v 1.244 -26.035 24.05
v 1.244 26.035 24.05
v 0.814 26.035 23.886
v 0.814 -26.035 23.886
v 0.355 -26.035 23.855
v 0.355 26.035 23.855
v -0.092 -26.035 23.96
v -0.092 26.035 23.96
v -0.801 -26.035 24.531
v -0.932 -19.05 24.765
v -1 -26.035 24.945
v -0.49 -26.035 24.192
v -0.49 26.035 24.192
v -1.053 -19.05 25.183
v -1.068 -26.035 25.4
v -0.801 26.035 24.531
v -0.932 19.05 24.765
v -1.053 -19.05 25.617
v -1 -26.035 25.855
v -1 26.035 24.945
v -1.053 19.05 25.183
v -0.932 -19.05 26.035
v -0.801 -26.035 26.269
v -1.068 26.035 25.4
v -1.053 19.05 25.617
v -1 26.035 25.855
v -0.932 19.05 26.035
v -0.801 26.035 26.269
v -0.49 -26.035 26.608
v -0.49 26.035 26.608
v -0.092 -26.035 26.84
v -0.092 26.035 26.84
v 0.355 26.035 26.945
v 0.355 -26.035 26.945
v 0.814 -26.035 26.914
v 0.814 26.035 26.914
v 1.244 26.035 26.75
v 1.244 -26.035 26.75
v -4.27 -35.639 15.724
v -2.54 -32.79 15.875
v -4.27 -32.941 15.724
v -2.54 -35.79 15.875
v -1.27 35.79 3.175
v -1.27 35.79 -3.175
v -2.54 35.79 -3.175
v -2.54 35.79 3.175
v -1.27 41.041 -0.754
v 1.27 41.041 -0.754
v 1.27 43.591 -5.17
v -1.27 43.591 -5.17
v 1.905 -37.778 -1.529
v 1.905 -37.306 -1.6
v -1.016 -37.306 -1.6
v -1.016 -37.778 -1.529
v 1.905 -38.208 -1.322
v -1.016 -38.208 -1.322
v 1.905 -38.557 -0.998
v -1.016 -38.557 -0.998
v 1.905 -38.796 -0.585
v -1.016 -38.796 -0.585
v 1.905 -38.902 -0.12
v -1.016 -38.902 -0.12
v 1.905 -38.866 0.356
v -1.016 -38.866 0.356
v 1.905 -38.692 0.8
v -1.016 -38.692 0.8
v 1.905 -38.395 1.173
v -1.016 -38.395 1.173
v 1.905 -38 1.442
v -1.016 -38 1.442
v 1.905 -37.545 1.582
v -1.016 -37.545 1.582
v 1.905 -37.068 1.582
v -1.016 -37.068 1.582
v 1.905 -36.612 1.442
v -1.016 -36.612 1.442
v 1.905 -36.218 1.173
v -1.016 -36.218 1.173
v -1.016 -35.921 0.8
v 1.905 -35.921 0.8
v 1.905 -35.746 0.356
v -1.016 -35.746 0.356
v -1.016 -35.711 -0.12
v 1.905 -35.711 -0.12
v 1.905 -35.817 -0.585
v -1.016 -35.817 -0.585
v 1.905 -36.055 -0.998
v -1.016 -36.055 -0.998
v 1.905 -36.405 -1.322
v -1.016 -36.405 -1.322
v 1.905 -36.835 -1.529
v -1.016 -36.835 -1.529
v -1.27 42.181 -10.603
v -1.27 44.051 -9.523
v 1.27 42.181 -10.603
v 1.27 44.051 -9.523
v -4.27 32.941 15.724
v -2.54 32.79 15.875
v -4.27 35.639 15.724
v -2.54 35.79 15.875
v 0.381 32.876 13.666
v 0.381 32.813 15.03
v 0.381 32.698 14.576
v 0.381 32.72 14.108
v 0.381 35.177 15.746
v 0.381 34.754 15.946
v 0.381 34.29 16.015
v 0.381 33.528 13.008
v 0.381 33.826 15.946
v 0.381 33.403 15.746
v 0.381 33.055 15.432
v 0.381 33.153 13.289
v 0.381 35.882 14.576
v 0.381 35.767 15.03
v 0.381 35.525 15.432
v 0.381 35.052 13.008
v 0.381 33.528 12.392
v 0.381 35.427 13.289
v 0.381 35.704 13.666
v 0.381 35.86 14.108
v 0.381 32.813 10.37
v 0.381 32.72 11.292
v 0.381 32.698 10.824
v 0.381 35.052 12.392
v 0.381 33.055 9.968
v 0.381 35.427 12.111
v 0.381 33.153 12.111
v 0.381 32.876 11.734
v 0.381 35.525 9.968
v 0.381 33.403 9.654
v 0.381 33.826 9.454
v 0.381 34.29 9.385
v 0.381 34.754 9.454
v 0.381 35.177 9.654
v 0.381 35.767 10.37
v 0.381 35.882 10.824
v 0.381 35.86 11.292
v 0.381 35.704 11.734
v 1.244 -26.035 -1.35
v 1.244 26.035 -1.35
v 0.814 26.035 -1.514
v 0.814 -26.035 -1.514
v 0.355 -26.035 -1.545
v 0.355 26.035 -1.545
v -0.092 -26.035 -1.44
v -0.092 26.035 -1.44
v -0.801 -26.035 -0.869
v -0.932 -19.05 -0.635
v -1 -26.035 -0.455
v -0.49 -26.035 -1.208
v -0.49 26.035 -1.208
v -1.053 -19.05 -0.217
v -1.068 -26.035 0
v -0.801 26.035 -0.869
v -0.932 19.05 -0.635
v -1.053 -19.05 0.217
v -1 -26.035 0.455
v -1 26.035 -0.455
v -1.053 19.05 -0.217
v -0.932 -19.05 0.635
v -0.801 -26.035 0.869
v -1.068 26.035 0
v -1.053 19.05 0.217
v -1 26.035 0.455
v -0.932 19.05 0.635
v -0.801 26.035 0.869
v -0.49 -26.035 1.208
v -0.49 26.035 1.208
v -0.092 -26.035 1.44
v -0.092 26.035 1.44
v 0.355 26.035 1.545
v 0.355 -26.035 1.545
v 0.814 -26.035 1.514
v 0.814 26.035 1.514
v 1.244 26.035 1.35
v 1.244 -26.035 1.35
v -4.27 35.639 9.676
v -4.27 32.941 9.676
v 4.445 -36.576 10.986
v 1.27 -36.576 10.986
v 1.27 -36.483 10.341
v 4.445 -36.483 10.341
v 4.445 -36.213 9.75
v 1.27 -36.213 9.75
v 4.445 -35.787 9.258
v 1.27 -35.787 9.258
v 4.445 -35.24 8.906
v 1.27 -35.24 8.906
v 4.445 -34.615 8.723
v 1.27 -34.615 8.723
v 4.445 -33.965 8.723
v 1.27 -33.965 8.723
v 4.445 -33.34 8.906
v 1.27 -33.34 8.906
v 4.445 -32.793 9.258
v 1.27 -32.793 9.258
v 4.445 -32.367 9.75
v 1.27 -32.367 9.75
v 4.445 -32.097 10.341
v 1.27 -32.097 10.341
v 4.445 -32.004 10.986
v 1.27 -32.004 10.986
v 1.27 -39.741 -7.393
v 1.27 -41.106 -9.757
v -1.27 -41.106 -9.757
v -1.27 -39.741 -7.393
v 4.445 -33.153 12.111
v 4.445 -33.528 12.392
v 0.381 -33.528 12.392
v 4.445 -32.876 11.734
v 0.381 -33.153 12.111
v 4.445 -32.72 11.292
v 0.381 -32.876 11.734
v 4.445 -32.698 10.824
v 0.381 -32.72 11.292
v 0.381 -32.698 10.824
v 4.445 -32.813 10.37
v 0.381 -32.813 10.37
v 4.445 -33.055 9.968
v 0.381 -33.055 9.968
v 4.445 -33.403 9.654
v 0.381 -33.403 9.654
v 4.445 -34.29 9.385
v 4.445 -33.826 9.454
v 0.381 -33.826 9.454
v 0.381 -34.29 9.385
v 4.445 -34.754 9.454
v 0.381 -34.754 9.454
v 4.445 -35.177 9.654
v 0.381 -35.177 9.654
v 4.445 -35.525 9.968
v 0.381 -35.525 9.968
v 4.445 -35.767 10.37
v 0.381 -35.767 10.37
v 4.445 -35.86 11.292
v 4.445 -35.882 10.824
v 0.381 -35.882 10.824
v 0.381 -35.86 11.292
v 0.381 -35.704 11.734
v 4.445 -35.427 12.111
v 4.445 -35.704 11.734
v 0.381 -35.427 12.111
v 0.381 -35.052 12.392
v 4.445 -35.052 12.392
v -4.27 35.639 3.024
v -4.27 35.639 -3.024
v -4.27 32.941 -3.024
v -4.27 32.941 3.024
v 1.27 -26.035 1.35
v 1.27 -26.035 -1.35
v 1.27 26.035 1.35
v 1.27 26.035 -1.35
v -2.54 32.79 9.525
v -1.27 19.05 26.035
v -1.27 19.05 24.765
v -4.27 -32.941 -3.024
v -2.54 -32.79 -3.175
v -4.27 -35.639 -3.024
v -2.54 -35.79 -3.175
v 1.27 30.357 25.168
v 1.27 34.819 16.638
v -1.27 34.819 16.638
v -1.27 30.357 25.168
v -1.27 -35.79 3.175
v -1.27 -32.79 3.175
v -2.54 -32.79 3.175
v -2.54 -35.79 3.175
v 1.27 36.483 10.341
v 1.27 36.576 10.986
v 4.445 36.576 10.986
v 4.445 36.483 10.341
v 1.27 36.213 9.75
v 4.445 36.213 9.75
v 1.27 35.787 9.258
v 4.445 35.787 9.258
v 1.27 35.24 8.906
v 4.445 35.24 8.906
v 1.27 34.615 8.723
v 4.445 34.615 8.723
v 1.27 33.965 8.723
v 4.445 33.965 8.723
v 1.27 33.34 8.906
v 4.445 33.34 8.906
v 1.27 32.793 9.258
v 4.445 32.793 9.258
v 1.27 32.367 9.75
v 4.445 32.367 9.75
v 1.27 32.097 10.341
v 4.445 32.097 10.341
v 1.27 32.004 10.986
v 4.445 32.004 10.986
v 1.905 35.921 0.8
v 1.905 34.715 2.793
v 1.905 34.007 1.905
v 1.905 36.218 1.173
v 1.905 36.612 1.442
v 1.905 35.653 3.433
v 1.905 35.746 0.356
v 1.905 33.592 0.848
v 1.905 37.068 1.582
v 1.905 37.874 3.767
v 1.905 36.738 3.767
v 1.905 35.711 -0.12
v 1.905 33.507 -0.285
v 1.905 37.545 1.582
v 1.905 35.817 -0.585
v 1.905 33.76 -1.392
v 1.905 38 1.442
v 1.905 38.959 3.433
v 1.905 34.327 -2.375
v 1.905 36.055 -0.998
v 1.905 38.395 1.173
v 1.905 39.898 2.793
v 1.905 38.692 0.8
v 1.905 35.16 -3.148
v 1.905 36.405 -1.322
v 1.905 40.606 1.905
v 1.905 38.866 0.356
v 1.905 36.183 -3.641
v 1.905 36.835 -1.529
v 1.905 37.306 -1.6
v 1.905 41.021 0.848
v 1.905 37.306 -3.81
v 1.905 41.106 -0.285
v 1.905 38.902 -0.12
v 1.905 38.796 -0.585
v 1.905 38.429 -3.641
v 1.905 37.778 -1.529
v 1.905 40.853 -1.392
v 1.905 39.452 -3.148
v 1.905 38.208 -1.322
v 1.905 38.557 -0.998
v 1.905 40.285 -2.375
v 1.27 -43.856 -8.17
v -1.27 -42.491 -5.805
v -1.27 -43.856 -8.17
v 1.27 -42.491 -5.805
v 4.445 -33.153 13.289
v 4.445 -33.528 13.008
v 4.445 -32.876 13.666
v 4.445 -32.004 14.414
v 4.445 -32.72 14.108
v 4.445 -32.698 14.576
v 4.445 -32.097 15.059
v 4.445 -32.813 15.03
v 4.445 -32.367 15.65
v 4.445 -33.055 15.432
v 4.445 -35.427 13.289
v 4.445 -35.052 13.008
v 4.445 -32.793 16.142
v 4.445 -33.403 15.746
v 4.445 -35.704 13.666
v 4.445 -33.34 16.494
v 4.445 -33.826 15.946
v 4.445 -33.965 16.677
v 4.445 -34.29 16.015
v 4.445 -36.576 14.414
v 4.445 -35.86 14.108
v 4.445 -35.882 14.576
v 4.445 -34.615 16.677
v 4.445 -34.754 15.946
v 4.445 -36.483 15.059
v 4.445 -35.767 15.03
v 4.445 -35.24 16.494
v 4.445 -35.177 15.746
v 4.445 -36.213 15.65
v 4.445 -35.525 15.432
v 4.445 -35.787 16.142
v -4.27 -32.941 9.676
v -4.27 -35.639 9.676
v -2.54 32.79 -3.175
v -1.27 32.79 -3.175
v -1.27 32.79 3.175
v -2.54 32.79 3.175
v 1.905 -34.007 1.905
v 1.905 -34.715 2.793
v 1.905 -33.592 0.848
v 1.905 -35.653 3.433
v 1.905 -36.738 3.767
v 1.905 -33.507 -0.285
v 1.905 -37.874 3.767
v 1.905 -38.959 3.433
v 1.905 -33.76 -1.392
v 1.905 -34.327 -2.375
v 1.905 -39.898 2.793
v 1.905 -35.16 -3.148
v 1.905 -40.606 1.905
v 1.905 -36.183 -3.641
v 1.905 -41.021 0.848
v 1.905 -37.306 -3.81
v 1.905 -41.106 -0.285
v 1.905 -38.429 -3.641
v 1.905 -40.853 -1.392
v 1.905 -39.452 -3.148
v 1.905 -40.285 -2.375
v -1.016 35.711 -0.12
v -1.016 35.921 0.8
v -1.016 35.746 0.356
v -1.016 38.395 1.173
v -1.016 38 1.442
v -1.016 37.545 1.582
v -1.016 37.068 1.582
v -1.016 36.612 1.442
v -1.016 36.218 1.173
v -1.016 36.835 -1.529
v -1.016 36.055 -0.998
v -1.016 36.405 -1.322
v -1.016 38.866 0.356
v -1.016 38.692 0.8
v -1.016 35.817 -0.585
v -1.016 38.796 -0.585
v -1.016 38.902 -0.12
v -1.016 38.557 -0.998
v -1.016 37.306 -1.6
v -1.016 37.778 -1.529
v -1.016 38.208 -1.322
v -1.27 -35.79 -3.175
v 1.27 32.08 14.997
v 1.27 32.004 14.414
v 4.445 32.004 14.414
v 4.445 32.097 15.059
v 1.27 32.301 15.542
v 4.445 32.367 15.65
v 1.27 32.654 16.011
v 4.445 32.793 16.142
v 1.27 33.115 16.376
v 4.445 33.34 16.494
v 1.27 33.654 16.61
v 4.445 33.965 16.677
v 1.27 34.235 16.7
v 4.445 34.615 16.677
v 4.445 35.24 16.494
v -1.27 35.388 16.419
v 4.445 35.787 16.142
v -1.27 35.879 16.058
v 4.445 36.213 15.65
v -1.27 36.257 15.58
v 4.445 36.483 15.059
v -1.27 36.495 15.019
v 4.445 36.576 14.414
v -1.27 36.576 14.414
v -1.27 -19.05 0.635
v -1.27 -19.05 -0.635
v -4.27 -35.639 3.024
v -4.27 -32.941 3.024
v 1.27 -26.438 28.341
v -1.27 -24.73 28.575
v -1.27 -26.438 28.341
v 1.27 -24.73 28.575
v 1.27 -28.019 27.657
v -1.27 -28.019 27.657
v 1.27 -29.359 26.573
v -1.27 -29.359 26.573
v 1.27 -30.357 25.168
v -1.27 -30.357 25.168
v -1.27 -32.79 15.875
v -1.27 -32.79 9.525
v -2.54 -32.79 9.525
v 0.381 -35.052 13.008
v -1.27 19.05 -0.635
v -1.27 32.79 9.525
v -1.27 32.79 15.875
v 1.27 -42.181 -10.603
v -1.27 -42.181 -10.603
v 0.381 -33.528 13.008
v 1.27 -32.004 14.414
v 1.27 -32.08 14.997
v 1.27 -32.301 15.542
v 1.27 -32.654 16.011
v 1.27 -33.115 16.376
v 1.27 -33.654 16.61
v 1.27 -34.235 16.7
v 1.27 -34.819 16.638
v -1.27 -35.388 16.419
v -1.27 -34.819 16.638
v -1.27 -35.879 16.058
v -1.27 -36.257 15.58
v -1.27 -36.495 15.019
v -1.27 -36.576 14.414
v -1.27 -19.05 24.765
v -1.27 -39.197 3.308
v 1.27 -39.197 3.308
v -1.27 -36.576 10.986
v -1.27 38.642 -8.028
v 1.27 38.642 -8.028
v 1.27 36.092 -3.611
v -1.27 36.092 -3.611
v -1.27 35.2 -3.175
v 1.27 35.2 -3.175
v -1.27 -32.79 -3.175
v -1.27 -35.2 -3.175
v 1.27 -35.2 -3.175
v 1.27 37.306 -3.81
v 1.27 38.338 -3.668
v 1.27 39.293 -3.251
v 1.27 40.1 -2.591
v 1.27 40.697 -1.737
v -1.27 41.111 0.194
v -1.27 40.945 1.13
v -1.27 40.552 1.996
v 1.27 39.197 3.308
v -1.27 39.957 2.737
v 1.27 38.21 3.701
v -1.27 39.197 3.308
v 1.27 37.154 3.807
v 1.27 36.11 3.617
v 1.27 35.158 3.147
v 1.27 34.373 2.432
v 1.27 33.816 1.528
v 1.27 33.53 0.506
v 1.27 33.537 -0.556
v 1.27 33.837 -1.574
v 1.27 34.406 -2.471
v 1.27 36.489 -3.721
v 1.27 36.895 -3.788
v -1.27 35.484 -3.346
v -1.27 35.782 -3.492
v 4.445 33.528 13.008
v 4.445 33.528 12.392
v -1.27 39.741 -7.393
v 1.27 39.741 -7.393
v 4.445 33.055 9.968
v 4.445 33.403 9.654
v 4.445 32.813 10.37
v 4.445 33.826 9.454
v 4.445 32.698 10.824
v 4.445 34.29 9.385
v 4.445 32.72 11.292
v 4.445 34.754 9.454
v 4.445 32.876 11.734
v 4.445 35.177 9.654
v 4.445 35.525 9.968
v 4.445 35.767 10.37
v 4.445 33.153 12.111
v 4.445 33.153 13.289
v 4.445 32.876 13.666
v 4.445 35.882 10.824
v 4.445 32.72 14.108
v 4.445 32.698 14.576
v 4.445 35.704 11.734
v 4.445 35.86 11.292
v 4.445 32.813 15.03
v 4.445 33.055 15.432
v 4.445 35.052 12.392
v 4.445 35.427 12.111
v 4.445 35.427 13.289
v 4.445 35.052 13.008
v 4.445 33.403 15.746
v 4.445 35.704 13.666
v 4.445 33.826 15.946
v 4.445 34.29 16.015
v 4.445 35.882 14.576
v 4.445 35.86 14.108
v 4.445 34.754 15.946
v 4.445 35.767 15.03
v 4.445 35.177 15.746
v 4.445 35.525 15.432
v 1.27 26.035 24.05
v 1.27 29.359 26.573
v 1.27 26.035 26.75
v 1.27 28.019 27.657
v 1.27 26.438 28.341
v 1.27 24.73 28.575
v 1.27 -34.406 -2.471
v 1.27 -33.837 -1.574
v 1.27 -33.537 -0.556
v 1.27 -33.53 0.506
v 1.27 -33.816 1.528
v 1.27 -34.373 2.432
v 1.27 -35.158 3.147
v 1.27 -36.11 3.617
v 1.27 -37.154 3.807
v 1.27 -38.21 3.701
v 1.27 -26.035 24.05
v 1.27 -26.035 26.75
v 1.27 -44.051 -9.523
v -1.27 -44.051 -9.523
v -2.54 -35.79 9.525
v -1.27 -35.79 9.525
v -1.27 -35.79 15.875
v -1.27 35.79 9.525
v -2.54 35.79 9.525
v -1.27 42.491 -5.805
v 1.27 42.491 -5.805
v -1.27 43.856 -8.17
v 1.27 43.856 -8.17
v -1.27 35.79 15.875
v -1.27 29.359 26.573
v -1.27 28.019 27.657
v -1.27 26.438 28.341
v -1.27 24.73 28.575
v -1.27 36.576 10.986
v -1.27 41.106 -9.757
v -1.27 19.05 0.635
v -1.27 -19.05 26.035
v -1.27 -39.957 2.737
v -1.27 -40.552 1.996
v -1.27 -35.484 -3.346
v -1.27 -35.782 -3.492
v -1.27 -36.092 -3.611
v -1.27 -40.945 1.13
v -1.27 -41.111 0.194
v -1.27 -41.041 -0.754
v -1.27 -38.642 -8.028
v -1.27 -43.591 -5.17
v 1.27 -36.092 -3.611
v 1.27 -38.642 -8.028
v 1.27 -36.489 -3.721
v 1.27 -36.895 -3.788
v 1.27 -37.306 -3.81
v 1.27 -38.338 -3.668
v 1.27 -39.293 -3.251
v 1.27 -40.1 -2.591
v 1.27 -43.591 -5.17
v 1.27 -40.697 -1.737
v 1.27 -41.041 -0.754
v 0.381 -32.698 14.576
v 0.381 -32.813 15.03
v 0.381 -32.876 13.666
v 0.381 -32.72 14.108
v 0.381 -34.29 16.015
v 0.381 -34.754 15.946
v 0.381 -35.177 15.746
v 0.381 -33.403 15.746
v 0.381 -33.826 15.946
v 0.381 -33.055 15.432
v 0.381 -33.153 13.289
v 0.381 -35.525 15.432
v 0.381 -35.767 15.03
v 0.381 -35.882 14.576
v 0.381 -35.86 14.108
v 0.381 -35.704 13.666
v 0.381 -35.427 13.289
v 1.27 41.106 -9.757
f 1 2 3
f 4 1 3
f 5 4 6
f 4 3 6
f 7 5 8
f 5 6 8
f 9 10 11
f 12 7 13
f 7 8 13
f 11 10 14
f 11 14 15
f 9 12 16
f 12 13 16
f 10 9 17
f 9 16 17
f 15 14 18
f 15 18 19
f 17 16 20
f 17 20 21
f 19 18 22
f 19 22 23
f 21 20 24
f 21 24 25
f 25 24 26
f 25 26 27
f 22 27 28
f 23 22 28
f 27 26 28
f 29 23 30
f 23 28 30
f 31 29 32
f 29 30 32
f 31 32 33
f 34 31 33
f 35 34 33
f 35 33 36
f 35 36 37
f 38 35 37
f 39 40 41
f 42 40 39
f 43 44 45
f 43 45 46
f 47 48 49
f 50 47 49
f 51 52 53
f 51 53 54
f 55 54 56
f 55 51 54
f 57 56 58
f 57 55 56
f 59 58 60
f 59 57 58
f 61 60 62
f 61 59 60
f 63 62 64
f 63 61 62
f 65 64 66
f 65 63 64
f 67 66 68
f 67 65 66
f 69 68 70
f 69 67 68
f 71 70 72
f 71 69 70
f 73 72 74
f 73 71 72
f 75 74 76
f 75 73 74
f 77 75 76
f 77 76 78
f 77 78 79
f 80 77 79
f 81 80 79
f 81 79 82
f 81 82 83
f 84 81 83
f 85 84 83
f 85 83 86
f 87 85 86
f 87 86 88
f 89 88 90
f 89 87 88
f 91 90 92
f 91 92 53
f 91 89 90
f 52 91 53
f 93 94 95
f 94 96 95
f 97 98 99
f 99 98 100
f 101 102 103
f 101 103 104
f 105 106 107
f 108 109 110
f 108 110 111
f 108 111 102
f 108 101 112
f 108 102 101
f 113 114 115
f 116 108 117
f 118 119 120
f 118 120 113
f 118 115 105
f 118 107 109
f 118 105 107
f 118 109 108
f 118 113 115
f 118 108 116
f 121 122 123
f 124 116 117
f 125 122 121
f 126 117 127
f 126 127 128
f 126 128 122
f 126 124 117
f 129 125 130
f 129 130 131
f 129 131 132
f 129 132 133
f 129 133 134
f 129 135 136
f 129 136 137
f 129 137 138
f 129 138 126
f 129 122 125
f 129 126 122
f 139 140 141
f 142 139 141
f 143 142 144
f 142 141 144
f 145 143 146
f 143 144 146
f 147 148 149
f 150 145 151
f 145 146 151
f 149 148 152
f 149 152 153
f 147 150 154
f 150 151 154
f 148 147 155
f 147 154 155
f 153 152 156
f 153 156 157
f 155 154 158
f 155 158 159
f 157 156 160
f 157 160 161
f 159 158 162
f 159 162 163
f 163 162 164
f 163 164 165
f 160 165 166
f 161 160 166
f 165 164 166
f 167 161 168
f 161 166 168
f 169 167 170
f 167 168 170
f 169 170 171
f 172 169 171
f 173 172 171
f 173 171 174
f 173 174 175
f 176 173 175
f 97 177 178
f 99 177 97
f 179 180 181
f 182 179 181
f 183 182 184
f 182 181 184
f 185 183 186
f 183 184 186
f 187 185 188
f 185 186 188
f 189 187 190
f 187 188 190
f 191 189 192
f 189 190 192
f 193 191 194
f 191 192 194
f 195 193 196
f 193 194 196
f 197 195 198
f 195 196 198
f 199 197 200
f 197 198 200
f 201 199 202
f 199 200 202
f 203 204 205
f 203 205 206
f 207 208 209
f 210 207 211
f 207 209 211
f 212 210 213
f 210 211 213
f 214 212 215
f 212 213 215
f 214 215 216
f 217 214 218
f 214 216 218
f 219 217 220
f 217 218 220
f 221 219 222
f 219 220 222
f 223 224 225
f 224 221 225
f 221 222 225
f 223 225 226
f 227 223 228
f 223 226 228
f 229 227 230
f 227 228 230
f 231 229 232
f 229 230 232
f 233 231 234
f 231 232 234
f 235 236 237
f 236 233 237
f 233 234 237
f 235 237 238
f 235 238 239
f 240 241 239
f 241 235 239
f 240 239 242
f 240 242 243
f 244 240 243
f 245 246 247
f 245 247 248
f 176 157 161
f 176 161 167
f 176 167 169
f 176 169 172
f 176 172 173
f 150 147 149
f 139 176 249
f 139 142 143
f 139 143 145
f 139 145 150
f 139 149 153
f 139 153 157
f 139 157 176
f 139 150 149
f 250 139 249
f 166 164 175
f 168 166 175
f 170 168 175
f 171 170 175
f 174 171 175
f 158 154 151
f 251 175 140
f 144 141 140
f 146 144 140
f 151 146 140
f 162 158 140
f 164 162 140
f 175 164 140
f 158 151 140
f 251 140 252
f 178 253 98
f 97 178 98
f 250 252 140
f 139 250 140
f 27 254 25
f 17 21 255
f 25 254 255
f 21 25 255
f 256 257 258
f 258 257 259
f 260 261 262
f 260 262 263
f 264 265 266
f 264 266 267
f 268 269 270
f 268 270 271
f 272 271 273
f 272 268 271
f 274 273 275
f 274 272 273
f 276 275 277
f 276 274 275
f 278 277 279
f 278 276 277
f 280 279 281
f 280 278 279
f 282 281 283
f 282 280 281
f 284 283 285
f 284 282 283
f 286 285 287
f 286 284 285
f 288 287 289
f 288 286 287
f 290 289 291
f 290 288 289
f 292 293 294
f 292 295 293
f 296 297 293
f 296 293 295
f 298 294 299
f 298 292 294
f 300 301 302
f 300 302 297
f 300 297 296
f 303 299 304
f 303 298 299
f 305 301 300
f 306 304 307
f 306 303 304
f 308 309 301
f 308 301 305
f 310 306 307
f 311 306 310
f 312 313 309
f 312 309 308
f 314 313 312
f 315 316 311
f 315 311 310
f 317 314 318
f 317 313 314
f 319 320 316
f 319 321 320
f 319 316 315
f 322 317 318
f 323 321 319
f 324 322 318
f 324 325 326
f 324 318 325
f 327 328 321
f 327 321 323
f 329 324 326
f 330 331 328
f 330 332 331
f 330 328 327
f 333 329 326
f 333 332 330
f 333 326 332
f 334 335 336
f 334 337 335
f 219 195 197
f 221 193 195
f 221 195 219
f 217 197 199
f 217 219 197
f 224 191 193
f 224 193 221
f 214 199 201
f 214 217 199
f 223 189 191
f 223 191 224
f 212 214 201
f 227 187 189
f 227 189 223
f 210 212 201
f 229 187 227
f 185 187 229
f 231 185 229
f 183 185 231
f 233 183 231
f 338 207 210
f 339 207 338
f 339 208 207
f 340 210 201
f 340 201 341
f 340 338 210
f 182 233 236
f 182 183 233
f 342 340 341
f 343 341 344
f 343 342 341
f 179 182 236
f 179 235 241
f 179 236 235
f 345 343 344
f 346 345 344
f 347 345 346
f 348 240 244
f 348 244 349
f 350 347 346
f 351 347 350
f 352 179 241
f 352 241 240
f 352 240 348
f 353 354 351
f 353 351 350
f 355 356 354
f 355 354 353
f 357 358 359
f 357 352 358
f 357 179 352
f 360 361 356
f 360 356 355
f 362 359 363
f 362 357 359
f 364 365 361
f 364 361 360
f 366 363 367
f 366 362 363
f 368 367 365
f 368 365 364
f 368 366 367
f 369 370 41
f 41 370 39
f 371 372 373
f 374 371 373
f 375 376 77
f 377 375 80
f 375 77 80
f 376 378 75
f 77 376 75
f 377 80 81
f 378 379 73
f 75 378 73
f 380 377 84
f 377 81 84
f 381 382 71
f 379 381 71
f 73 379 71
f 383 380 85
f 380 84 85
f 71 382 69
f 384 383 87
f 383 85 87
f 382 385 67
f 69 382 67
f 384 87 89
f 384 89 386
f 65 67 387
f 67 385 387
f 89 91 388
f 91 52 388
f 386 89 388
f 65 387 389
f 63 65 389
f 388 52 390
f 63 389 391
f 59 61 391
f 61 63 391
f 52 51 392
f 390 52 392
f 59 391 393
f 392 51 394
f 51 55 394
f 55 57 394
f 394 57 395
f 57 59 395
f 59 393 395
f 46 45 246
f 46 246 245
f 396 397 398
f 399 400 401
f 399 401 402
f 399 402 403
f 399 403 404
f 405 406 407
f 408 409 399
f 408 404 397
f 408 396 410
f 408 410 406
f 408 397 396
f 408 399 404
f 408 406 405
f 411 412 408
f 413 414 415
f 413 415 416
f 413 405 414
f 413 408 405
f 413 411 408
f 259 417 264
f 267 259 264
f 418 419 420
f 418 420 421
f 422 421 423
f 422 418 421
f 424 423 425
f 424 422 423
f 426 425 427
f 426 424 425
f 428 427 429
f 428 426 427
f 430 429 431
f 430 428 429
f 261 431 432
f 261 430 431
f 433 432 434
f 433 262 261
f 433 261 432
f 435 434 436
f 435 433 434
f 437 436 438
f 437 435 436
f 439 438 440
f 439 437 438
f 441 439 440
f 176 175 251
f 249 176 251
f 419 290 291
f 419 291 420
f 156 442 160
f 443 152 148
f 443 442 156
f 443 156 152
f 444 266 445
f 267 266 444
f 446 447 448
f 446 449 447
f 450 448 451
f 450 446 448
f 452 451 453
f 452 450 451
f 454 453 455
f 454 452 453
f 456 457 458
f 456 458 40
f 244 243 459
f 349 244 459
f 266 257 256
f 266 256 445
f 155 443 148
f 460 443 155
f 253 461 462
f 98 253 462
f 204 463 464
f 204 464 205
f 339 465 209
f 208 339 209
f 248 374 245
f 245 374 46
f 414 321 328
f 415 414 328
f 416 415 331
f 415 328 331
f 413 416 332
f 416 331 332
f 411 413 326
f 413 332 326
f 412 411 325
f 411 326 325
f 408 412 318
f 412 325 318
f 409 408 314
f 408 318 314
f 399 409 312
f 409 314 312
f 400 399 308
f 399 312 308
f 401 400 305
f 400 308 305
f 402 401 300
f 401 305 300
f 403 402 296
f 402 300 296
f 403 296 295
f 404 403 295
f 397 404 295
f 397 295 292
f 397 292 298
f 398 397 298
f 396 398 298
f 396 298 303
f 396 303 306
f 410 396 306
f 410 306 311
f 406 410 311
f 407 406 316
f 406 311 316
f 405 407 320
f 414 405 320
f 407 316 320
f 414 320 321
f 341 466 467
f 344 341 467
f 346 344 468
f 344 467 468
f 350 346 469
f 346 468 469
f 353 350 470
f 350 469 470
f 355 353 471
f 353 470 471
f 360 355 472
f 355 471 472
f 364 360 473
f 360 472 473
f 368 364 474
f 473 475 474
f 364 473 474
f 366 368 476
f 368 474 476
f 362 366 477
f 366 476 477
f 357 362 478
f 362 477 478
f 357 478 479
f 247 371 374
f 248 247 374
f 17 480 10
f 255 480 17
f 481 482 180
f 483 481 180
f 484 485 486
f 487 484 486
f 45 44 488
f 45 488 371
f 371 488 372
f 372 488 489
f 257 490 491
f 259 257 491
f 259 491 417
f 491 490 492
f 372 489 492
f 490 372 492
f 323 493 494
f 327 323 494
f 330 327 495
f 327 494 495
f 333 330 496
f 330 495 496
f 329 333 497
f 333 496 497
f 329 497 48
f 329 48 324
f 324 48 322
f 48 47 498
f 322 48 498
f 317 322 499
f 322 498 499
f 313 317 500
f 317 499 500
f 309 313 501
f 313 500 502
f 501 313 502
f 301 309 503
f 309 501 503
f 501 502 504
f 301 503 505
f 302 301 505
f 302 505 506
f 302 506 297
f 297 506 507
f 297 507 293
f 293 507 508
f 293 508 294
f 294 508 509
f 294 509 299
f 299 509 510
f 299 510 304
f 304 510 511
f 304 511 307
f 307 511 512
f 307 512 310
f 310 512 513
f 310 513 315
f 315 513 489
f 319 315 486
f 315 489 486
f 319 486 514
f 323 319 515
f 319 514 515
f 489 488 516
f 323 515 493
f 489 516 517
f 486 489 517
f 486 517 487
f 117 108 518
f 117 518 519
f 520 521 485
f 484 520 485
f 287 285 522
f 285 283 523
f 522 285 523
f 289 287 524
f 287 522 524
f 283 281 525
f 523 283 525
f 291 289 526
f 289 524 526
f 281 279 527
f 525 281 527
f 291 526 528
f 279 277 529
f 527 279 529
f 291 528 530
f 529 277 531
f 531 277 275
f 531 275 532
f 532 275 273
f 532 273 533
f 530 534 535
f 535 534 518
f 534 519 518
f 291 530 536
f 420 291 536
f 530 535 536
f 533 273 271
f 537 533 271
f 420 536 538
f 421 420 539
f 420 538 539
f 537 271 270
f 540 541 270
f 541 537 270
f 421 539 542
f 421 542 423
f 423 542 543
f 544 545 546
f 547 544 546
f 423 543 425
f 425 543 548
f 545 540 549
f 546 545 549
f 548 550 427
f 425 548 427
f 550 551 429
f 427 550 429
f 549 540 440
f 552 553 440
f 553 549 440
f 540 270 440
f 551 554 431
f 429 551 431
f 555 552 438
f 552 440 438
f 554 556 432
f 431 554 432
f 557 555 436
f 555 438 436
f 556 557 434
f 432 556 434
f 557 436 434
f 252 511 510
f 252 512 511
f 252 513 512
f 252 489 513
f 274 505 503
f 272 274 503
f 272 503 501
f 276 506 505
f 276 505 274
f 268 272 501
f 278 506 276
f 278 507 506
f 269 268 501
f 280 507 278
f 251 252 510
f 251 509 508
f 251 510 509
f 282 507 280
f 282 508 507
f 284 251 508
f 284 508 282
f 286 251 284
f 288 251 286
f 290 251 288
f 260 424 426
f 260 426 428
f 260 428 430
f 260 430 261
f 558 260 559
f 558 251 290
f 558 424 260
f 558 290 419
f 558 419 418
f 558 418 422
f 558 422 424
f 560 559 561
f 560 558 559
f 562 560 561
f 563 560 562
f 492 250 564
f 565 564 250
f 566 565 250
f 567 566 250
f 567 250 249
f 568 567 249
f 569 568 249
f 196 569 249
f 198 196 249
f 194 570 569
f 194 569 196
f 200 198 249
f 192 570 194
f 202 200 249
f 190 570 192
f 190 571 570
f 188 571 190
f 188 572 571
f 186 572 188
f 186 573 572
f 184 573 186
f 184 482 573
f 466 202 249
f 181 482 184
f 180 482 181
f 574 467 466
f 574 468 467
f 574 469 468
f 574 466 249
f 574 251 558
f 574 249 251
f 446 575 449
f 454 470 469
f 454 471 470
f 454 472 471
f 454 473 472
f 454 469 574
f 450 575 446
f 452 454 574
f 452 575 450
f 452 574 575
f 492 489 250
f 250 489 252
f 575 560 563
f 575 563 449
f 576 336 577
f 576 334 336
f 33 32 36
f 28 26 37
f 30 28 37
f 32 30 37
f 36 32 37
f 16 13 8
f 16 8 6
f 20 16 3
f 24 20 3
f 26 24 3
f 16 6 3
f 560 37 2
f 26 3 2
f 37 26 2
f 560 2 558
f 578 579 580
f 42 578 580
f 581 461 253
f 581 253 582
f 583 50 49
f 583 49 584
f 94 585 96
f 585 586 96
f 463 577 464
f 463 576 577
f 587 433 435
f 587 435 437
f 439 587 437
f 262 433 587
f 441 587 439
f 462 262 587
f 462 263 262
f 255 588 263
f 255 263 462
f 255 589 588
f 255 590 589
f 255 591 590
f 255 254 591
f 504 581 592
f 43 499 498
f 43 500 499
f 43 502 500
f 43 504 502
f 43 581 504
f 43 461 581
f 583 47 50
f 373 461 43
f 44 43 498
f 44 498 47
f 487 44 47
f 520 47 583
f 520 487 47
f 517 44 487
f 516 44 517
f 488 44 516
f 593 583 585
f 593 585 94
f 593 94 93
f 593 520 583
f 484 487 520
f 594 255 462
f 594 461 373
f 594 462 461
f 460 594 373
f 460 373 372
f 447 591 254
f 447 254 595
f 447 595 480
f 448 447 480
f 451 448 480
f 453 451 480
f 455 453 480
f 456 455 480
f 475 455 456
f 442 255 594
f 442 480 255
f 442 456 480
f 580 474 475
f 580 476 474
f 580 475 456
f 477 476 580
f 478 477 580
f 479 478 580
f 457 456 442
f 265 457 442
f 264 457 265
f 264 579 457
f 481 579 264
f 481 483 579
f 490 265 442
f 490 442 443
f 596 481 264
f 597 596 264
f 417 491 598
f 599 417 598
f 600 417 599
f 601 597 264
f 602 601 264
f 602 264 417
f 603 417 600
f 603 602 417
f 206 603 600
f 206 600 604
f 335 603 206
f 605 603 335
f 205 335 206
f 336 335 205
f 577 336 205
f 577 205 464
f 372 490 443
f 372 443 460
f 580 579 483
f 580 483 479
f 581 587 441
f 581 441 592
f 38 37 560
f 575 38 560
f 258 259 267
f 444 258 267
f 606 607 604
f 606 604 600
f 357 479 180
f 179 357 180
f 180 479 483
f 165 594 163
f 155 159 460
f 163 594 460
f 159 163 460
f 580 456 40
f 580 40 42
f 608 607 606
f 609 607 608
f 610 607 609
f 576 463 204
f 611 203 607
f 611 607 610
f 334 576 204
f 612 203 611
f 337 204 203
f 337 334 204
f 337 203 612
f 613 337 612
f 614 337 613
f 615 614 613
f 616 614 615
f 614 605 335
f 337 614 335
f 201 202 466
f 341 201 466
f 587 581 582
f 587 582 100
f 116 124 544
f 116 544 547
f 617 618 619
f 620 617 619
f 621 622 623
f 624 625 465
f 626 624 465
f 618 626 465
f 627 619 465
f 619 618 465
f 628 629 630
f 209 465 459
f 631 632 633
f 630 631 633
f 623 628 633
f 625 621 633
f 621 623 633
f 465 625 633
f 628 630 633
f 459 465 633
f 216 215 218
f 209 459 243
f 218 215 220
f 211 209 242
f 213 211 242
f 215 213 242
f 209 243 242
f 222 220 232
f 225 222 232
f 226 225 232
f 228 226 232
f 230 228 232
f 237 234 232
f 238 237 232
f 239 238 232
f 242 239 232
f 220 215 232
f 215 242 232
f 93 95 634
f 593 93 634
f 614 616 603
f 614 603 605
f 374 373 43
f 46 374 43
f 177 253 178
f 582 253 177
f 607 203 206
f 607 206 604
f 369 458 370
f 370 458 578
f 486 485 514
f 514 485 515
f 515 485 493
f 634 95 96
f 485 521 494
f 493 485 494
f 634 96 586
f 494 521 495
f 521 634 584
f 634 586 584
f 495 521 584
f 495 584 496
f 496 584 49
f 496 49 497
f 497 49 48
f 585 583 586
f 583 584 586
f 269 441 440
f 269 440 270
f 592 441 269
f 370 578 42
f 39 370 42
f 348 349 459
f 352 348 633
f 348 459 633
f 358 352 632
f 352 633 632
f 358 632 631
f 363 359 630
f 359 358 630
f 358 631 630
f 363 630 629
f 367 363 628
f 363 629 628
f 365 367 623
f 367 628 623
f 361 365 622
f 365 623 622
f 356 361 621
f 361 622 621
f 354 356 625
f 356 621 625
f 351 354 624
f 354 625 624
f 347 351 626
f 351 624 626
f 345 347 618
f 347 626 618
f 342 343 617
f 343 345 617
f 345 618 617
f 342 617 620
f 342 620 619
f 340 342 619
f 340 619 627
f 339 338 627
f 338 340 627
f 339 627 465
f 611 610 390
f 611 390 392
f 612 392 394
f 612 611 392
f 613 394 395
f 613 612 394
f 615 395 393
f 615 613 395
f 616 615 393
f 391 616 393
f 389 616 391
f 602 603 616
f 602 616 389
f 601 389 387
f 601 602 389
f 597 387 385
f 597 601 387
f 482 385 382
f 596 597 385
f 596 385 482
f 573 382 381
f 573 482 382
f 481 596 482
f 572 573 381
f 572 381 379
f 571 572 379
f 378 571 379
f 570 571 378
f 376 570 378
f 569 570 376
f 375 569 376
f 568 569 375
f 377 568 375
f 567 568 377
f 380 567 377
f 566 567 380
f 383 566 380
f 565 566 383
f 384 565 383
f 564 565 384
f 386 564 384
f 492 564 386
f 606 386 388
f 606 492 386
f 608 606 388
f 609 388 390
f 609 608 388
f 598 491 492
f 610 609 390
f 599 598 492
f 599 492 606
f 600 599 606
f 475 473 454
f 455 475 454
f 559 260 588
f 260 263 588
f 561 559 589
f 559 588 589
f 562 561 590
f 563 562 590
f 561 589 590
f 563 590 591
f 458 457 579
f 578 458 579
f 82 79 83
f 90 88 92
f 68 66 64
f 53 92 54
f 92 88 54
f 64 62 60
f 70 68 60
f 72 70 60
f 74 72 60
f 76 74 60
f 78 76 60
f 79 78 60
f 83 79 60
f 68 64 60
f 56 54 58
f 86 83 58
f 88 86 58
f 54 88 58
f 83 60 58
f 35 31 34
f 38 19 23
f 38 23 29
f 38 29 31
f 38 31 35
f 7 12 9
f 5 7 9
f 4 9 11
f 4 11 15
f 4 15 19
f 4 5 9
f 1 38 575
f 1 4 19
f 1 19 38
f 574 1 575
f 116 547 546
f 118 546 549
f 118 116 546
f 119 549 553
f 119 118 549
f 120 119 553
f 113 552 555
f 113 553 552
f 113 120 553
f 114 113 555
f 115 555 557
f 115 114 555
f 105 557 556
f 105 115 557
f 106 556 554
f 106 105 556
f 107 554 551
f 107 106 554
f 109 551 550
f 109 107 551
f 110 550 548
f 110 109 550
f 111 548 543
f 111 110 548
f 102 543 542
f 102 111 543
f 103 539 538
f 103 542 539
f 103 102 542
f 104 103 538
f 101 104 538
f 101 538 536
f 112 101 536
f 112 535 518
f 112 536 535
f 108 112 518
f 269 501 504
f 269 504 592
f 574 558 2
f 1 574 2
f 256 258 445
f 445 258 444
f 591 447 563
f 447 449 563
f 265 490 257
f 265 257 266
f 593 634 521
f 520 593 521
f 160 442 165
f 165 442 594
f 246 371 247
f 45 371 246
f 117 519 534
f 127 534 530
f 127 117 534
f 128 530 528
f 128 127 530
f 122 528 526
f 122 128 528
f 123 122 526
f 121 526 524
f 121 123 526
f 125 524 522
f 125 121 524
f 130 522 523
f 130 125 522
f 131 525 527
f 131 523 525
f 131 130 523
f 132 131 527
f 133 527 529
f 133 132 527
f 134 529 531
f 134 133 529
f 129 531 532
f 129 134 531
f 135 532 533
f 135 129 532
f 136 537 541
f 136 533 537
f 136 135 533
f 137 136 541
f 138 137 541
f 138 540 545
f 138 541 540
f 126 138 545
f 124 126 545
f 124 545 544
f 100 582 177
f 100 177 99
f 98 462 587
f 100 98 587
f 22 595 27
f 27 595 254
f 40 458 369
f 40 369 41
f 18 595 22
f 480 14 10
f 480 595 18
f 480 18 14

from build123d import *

# Parameters (mm, degrees)
DOWELSUPPORT_DEPTH          = 1.905
DOWELSUPPORT_DEPTH_BACK     = 1.27
SKETCH3_R                   = 3.81
SKETCH5_W                   = 6.35
SKETCH5_H                   = 57.15
SLIDERDOWELSUPPORT_DEPTH    = 1.27
SKETCH17_R                  = 1.549999948
SLIDERDOWELCUTOUT_DEPTH     = 26.035
CUT_EXTRUDE2_DEPTH          = 42.370444934
CUT_EXTRUDE2_DEPTH_BACK     = 42.370444934
SKETCH18_W                  = 1.27
SKETCH18_H                  = 38.1
LPATTERN1_COUNT             = 2
LPATTERN1_PITCH             = 25.4
LATERALSUPPORT_DEPTH        = 1.27
SKETCH8_W                   = 6.35
SKETCH8_H                   = 3
TABSUPPORT_DEPTH            = 1.27
STRINGDOWELSUPPORT_START    = -1.27
STRINGDOWELSUPPORT_DEPTH    = 5.715
INTERSUPPORT_DEPTH          = 1.27
SKETCH10_W                  = 6.35
SKETCH10_H                  = 3
TABBASE_DEPTH               = 1.27
SKETCH12_W                  = 6.35
SKETCH12_H                  = 3
TABDRAFT_DEPTH              = 1.73
TABDRAFT_DRAFT              = 5
TABDRAFT_PROFILE_2_DEPTH    = 1.73
TABDRAFT_PROFILE_2_DRAFT    = 5
STRINGDOWELHOLES_DEPTH      = 53.869299342
STRINGDOWELHOLES_DEPTH_BACK = 1.524
SKETCH14_R                  = 1.600000102
PULLEYDOWELHOLE_DEPTH       = 2.921
FILLET1_R                   = 6.35


with BuildPart() as part:
    # Sketch3 → DowelSupport (new, two sides: drawn at the far end of the back side and taken through both)
    with BuildSketch(Plane(origin=(0, 0, 0), x_dir=(0, 0, -1), z_dir=(1, 0, 0)).offset(-DOWELSUPPORT_DEPTH_BACK)):
        with Locations((0, 37.30625)):
            Circle(SKETCH3_R)
    extrude(amount=DOWELSUPPORT_DEPTH + DOWELSUPPORT_DEPTH_BACK)

    # Sketch8 → TabSupport (add, symmetric)
    with BuildSketch(Plane(origin=(0, 0, 0), x_dir=(0, 0, -1), z_dir=(1, 0, 0))):
        with Locations((0, 34.29)):
            Rectangle(SKETCH8_W, SKETCH8_H)
        with Locations((-12.7, 34.29)):
            Rectangle(SKETCH8_W, SKETCH8_H)
    extrude(amount=TABSUPPORT_DEPTH, both=True)


with BuildPart() as body_2:
    # Sketch5 → SliderDowelSupport (new, symmetric)
    with BuildSketch(Plane(origin=(0, 0, 0), x_dir=(0, 0, -1), z_dir=(1, 0, 0))):
        Rectangle(SKETCH5_W, SKETCH5_H)
    extrude(amount=SLIDERDOWELSUPPORT_DEPTH, both=True)

    # Sketch17 → SliderDowelCutout (cut, symmetric)
    with BuildSketch(Plane(origin=(0, 0, 0), x_dir=(1, 0, 0), z_dir=(0, 1, 0))):
        with BuildLine():
            Line((2.032000054, -1.350000094), (2.032000054, 0))
            ThreePointArc((2.032000054, 0), (1.82045896, -0.78168263), (1.243577144, -1.350000094))
            Line((1.243577144, -1.350000094), (2.032000054, -1.350000094))
        make_face()
        with BuildLine():
            Line((2.032000054, 0), (2.032000054, 1.350000094))
            Line((2.032000054, 1.350000094), (1.243577144, 1.350000094))
            ThreePointArc((1.243577144, 1.350000094), (1.82045896, 0.78168263), (2.032000054, 0))
        make_face()
        with Locations((0.482000106, 0)):
            Circle(SKETCH17_R)
    extrude(amount=SLIDERDOWELCUTOUT_DEPTH, both=True, mode=Mode.SUBTRACT)

    # Sketch18 → Cut-Extrude2 (cut, two sides: drawn at the far end of the back side and taken through both)
    with BuildSketch(Plane(origin=(1.27, 0, 0), x_dir=(0, 0, -1), z_dir=(1, 0, 0)).offset(-CUT_EXTRUDE2_DEPTH_BACK)):
        Rectangle(SKETCH18_W, SKETCH18_H)
    extrude(amount=CUT_EXTRUDE2_DEPTH + CUT_EXTRUDE2_DEPTH_BACK, mode=Mode.SUBTRACT)


with BuildPart() as lpattern1_1:
    # LPattern1: pattern copy
    add(body_2.part.moved(Location(Vector(0, 0, 1) * (1 * LPATTERN1_PITCH))))


with BuildPart() as body_4:
    # Sketch6 → LateralSupport (new, symmetric)
    with BuildSketch(Plane(origin=(0, 0, 0), x_dir=(0, 0, -1), z_dir=(1, 0, 0))):
        Polygon((7.392863577, 39.741434671), (5.805363577, 42.491065329), (8.169612929, 43.856065329), (9.523465192, 44.051124423), (10.602965192, 42.181375577), (9.757112929, 41.106434671), align=None)
    extrude(amount=LATERALSUPPORT_DEPTH, both=True)


with BuildPart() as tabsupport_piece_1:
    # of the separate pieces the step leaves, piece 1, a body of its own (tabsupport_pieces)
    add(part.part.solids().sort_by_distance((0, 37.30625, -3.81))[0])


with BuildPart() as tabsupport_piece_2:
    # of the separate pieces the step leaves, piece 2, a body of its own (tabsupport_pieces)
    add(part.part.solids().sort_by_distance((-1.27, 32.79, 9.525))[0])

    # Sketch15 → StringDowelSupport (add)
    with BuildSketch(Plane(origin=(0, 0, 0), x_dir=(0, 0, -1), z_dir=(1, 0, 0)).offset(STRINGDOWELSUPPORT_START)):
        with BuildLine():
            Line((-14.4145, 36.576), (-10.9855, 36.576))
            ThreePointArc((-10.9855, 36.576), (-8.6995, 34.29), (-10.9855, 32.004))
            Line((-10.9855, 32.004), (-14.4145, 32.004))
            ThreePointArc((-14.4145, 32.004), (-16.7005, 34.29), (-14.4145, 36.576))
        make_face()
    extrude(amount=STRINGDOWELSUPPORT_DEPTH)


with BuildPart() as body_2_1:
    add(body_2.part)

    add(lpattern1_1.part)  # InterSupport merges LPattern1_1

    add(body_4.part)  # InterSupport merges body 4

    add(tabsupport_piece_1.part)  # InterSupport merges TabSupport piece 1

    add(tabsupport_piece_2.part)  # InterSupport merges TabSupport piece 2
    # Sketch7 → InterSupport (add, symmetric)
    with BuildSketch(Plane(origin=(0, 0, 0), x_dir=(0, 0, -1), z_dir=(1, 0, 0))):
        Polygon((5.170363577, 43.590917591), (8.027863577, 38.641582409), (1.42875, 34.831582409), (-1.42875, 39.780917591), align=None)
        Polygon((-3.175, 22.225), (-3.175, 28.575), (3.175, 28.575), (3.175, 32.79), (0.923046602, 34.601940251), (-0.923046602, 40.010559749), (-10.9855, 36.576), (-14.4145, 36.576), (-15.109807039, 35.619115541), (-28.575, 28.575), (-22.225, 28.575), (-22.225, 0), (-3.175, 0), align=None)
    extrude(amount=INTERSUPPORT_DEPTH, both=True)

    # Sketch10 → TabBase (add)
    with BuildSketch(Plane.ZY.offset(1.27)):
        with Locations((0, 34.29)):
            Rectangle(SKETCH10_W, SKETCH10_H)
        with Locations((12.7, 34.29)):
            Rectangle(SKETCH10_W, SKETCH10_H)
    extrude(amount=TABBASE_DEPTH)


with BuildPart() as tabdraft_tool:
    # Sketch12 → TabDraft (with draft: the straight prism first)
    with BuildSketch(Plane.ZY.offset(2.54)):
        with Locations((0, 34.29)):
            Rectangle(SKETCH12_W, SKETCH12_H)
    extrude(amount=TABDRAFT_DEPTH)
    # TabDraft: the draft: its side faces are tilted about the plane it starts from
    tabdraft_sides = [tabdraft_tool.faces().sort_by_distance(p)[0] for p in [
        (-3.405, 34.29, 3.175),
        (-3.405, 35.79, 0),
        (-3.405, 34.29, -3.175),
        (-3.405, 32.79, 0),
    ]]
    draft(tabdraft_sides, Plane.ZY.offset(2.54), TABDRAFT_DRAFT)


with BuildPart() as body_2_2:
    add(body_2_1.part)

    # TabDraft: add tabdraft_tool
    add(tabdraft_tool.part)


with BuildPart() as tabdraft_profile_2_tool:
    # Sketch12 → TabDraft profile 2 (with draft: the straight prism first)
    with BuildSketch(Plane.ZY.offset(2.54)):
        with Locations((12.7, 34.29)):
            Rectangle(SKETCH12_W, SKETCH12_H)
    extrude(amount=TABDRAFT_PROFILE_2_DEPTH)
    # TabDraft profile 2: the draft: its side faces are tilted about the plane it starts from
    tabdraft_profile_2_sides = [tabdraft_profile_2_tool.faces().sort_by_distance(p)[0] for p in [
        (-3.405, 34.29, 9.525),
        (-3.405, 32.79, 12.7),
        (-3.405, 34.29, 15.875),
        (-3.405, 35.79, 12.7),
    ]]
    draft(tabdraft_profile_2_sides, Plane.ZY.offset(2.54), TABDRAFT_PROFILE_2_DRAFT)


with BuildPart() as body_2_3:
    add(body_2_2.part)

    # TabDraft profile 2: add tabdraft_profile_2_tool
    add(tabdraft_profile_2_tool.part)

    # Sketch16 → StringDowelHoles (cut, two sides: drawn at the far end of the back side and taken through both)
    with BuildSketch(Plane(origin=(1.905, 0, 0), x_dir=(0, 0, -1), z_dir=(1, 0, 0)).offset(-STRINGDOWELHOLES_DEPTH_BACK)):
        with BuildLine():
            Line((-13.00760401, 33.528), (-12.39239599, 33.528))
            ThreePointArc((-12.39239599, 33.528), (-9.385499898, 34.29), (-12.39239599, 35.052))
            Line((-12.39239599, 35.052), (-13.00760401, 35.052))
            ThreePointArc((-13.00760401, 35.052), (-16.014500102, 34.29), (-13.00760401, 33.528))
        make_face()
    extrude(amount=STRINGDOWELHOLES_DEPTH + STRINGDOWELHOLES_DEPTH_BACK, mode=Mode.SUBTRACT)

    # Sketch14 → PulleyDowelHole (cut)
    with BuildSketch(Plane(origin=(1.905, 0, 0), x_dir=(0, 0, -1), z_dir=(1, 0, 0))):
        with Locations((0, 37.30625)):
            Circle(SKETCH14_R)
    extrude(amount=-PULLEYDOWELHOLE_DEPTH, mode=Mode.SUBTRACT)

    # Mirror1: body 2 across plane


with BuildPart() as body_2_4:
    add(body_2_3.part)
    add(body_2_3.part.mirror(Plane.ZX))

    # Fillet1
    fillet1_edges = [body_2_4.edges().sort_by_distance(p)[0] for p in [
        (0, -28.575, 28.575),
        (0, 28.575, 28.575),
    ]]
    fillet(fillet1_edges, radius=FILLET1_R)


solid = body_2_4.part
